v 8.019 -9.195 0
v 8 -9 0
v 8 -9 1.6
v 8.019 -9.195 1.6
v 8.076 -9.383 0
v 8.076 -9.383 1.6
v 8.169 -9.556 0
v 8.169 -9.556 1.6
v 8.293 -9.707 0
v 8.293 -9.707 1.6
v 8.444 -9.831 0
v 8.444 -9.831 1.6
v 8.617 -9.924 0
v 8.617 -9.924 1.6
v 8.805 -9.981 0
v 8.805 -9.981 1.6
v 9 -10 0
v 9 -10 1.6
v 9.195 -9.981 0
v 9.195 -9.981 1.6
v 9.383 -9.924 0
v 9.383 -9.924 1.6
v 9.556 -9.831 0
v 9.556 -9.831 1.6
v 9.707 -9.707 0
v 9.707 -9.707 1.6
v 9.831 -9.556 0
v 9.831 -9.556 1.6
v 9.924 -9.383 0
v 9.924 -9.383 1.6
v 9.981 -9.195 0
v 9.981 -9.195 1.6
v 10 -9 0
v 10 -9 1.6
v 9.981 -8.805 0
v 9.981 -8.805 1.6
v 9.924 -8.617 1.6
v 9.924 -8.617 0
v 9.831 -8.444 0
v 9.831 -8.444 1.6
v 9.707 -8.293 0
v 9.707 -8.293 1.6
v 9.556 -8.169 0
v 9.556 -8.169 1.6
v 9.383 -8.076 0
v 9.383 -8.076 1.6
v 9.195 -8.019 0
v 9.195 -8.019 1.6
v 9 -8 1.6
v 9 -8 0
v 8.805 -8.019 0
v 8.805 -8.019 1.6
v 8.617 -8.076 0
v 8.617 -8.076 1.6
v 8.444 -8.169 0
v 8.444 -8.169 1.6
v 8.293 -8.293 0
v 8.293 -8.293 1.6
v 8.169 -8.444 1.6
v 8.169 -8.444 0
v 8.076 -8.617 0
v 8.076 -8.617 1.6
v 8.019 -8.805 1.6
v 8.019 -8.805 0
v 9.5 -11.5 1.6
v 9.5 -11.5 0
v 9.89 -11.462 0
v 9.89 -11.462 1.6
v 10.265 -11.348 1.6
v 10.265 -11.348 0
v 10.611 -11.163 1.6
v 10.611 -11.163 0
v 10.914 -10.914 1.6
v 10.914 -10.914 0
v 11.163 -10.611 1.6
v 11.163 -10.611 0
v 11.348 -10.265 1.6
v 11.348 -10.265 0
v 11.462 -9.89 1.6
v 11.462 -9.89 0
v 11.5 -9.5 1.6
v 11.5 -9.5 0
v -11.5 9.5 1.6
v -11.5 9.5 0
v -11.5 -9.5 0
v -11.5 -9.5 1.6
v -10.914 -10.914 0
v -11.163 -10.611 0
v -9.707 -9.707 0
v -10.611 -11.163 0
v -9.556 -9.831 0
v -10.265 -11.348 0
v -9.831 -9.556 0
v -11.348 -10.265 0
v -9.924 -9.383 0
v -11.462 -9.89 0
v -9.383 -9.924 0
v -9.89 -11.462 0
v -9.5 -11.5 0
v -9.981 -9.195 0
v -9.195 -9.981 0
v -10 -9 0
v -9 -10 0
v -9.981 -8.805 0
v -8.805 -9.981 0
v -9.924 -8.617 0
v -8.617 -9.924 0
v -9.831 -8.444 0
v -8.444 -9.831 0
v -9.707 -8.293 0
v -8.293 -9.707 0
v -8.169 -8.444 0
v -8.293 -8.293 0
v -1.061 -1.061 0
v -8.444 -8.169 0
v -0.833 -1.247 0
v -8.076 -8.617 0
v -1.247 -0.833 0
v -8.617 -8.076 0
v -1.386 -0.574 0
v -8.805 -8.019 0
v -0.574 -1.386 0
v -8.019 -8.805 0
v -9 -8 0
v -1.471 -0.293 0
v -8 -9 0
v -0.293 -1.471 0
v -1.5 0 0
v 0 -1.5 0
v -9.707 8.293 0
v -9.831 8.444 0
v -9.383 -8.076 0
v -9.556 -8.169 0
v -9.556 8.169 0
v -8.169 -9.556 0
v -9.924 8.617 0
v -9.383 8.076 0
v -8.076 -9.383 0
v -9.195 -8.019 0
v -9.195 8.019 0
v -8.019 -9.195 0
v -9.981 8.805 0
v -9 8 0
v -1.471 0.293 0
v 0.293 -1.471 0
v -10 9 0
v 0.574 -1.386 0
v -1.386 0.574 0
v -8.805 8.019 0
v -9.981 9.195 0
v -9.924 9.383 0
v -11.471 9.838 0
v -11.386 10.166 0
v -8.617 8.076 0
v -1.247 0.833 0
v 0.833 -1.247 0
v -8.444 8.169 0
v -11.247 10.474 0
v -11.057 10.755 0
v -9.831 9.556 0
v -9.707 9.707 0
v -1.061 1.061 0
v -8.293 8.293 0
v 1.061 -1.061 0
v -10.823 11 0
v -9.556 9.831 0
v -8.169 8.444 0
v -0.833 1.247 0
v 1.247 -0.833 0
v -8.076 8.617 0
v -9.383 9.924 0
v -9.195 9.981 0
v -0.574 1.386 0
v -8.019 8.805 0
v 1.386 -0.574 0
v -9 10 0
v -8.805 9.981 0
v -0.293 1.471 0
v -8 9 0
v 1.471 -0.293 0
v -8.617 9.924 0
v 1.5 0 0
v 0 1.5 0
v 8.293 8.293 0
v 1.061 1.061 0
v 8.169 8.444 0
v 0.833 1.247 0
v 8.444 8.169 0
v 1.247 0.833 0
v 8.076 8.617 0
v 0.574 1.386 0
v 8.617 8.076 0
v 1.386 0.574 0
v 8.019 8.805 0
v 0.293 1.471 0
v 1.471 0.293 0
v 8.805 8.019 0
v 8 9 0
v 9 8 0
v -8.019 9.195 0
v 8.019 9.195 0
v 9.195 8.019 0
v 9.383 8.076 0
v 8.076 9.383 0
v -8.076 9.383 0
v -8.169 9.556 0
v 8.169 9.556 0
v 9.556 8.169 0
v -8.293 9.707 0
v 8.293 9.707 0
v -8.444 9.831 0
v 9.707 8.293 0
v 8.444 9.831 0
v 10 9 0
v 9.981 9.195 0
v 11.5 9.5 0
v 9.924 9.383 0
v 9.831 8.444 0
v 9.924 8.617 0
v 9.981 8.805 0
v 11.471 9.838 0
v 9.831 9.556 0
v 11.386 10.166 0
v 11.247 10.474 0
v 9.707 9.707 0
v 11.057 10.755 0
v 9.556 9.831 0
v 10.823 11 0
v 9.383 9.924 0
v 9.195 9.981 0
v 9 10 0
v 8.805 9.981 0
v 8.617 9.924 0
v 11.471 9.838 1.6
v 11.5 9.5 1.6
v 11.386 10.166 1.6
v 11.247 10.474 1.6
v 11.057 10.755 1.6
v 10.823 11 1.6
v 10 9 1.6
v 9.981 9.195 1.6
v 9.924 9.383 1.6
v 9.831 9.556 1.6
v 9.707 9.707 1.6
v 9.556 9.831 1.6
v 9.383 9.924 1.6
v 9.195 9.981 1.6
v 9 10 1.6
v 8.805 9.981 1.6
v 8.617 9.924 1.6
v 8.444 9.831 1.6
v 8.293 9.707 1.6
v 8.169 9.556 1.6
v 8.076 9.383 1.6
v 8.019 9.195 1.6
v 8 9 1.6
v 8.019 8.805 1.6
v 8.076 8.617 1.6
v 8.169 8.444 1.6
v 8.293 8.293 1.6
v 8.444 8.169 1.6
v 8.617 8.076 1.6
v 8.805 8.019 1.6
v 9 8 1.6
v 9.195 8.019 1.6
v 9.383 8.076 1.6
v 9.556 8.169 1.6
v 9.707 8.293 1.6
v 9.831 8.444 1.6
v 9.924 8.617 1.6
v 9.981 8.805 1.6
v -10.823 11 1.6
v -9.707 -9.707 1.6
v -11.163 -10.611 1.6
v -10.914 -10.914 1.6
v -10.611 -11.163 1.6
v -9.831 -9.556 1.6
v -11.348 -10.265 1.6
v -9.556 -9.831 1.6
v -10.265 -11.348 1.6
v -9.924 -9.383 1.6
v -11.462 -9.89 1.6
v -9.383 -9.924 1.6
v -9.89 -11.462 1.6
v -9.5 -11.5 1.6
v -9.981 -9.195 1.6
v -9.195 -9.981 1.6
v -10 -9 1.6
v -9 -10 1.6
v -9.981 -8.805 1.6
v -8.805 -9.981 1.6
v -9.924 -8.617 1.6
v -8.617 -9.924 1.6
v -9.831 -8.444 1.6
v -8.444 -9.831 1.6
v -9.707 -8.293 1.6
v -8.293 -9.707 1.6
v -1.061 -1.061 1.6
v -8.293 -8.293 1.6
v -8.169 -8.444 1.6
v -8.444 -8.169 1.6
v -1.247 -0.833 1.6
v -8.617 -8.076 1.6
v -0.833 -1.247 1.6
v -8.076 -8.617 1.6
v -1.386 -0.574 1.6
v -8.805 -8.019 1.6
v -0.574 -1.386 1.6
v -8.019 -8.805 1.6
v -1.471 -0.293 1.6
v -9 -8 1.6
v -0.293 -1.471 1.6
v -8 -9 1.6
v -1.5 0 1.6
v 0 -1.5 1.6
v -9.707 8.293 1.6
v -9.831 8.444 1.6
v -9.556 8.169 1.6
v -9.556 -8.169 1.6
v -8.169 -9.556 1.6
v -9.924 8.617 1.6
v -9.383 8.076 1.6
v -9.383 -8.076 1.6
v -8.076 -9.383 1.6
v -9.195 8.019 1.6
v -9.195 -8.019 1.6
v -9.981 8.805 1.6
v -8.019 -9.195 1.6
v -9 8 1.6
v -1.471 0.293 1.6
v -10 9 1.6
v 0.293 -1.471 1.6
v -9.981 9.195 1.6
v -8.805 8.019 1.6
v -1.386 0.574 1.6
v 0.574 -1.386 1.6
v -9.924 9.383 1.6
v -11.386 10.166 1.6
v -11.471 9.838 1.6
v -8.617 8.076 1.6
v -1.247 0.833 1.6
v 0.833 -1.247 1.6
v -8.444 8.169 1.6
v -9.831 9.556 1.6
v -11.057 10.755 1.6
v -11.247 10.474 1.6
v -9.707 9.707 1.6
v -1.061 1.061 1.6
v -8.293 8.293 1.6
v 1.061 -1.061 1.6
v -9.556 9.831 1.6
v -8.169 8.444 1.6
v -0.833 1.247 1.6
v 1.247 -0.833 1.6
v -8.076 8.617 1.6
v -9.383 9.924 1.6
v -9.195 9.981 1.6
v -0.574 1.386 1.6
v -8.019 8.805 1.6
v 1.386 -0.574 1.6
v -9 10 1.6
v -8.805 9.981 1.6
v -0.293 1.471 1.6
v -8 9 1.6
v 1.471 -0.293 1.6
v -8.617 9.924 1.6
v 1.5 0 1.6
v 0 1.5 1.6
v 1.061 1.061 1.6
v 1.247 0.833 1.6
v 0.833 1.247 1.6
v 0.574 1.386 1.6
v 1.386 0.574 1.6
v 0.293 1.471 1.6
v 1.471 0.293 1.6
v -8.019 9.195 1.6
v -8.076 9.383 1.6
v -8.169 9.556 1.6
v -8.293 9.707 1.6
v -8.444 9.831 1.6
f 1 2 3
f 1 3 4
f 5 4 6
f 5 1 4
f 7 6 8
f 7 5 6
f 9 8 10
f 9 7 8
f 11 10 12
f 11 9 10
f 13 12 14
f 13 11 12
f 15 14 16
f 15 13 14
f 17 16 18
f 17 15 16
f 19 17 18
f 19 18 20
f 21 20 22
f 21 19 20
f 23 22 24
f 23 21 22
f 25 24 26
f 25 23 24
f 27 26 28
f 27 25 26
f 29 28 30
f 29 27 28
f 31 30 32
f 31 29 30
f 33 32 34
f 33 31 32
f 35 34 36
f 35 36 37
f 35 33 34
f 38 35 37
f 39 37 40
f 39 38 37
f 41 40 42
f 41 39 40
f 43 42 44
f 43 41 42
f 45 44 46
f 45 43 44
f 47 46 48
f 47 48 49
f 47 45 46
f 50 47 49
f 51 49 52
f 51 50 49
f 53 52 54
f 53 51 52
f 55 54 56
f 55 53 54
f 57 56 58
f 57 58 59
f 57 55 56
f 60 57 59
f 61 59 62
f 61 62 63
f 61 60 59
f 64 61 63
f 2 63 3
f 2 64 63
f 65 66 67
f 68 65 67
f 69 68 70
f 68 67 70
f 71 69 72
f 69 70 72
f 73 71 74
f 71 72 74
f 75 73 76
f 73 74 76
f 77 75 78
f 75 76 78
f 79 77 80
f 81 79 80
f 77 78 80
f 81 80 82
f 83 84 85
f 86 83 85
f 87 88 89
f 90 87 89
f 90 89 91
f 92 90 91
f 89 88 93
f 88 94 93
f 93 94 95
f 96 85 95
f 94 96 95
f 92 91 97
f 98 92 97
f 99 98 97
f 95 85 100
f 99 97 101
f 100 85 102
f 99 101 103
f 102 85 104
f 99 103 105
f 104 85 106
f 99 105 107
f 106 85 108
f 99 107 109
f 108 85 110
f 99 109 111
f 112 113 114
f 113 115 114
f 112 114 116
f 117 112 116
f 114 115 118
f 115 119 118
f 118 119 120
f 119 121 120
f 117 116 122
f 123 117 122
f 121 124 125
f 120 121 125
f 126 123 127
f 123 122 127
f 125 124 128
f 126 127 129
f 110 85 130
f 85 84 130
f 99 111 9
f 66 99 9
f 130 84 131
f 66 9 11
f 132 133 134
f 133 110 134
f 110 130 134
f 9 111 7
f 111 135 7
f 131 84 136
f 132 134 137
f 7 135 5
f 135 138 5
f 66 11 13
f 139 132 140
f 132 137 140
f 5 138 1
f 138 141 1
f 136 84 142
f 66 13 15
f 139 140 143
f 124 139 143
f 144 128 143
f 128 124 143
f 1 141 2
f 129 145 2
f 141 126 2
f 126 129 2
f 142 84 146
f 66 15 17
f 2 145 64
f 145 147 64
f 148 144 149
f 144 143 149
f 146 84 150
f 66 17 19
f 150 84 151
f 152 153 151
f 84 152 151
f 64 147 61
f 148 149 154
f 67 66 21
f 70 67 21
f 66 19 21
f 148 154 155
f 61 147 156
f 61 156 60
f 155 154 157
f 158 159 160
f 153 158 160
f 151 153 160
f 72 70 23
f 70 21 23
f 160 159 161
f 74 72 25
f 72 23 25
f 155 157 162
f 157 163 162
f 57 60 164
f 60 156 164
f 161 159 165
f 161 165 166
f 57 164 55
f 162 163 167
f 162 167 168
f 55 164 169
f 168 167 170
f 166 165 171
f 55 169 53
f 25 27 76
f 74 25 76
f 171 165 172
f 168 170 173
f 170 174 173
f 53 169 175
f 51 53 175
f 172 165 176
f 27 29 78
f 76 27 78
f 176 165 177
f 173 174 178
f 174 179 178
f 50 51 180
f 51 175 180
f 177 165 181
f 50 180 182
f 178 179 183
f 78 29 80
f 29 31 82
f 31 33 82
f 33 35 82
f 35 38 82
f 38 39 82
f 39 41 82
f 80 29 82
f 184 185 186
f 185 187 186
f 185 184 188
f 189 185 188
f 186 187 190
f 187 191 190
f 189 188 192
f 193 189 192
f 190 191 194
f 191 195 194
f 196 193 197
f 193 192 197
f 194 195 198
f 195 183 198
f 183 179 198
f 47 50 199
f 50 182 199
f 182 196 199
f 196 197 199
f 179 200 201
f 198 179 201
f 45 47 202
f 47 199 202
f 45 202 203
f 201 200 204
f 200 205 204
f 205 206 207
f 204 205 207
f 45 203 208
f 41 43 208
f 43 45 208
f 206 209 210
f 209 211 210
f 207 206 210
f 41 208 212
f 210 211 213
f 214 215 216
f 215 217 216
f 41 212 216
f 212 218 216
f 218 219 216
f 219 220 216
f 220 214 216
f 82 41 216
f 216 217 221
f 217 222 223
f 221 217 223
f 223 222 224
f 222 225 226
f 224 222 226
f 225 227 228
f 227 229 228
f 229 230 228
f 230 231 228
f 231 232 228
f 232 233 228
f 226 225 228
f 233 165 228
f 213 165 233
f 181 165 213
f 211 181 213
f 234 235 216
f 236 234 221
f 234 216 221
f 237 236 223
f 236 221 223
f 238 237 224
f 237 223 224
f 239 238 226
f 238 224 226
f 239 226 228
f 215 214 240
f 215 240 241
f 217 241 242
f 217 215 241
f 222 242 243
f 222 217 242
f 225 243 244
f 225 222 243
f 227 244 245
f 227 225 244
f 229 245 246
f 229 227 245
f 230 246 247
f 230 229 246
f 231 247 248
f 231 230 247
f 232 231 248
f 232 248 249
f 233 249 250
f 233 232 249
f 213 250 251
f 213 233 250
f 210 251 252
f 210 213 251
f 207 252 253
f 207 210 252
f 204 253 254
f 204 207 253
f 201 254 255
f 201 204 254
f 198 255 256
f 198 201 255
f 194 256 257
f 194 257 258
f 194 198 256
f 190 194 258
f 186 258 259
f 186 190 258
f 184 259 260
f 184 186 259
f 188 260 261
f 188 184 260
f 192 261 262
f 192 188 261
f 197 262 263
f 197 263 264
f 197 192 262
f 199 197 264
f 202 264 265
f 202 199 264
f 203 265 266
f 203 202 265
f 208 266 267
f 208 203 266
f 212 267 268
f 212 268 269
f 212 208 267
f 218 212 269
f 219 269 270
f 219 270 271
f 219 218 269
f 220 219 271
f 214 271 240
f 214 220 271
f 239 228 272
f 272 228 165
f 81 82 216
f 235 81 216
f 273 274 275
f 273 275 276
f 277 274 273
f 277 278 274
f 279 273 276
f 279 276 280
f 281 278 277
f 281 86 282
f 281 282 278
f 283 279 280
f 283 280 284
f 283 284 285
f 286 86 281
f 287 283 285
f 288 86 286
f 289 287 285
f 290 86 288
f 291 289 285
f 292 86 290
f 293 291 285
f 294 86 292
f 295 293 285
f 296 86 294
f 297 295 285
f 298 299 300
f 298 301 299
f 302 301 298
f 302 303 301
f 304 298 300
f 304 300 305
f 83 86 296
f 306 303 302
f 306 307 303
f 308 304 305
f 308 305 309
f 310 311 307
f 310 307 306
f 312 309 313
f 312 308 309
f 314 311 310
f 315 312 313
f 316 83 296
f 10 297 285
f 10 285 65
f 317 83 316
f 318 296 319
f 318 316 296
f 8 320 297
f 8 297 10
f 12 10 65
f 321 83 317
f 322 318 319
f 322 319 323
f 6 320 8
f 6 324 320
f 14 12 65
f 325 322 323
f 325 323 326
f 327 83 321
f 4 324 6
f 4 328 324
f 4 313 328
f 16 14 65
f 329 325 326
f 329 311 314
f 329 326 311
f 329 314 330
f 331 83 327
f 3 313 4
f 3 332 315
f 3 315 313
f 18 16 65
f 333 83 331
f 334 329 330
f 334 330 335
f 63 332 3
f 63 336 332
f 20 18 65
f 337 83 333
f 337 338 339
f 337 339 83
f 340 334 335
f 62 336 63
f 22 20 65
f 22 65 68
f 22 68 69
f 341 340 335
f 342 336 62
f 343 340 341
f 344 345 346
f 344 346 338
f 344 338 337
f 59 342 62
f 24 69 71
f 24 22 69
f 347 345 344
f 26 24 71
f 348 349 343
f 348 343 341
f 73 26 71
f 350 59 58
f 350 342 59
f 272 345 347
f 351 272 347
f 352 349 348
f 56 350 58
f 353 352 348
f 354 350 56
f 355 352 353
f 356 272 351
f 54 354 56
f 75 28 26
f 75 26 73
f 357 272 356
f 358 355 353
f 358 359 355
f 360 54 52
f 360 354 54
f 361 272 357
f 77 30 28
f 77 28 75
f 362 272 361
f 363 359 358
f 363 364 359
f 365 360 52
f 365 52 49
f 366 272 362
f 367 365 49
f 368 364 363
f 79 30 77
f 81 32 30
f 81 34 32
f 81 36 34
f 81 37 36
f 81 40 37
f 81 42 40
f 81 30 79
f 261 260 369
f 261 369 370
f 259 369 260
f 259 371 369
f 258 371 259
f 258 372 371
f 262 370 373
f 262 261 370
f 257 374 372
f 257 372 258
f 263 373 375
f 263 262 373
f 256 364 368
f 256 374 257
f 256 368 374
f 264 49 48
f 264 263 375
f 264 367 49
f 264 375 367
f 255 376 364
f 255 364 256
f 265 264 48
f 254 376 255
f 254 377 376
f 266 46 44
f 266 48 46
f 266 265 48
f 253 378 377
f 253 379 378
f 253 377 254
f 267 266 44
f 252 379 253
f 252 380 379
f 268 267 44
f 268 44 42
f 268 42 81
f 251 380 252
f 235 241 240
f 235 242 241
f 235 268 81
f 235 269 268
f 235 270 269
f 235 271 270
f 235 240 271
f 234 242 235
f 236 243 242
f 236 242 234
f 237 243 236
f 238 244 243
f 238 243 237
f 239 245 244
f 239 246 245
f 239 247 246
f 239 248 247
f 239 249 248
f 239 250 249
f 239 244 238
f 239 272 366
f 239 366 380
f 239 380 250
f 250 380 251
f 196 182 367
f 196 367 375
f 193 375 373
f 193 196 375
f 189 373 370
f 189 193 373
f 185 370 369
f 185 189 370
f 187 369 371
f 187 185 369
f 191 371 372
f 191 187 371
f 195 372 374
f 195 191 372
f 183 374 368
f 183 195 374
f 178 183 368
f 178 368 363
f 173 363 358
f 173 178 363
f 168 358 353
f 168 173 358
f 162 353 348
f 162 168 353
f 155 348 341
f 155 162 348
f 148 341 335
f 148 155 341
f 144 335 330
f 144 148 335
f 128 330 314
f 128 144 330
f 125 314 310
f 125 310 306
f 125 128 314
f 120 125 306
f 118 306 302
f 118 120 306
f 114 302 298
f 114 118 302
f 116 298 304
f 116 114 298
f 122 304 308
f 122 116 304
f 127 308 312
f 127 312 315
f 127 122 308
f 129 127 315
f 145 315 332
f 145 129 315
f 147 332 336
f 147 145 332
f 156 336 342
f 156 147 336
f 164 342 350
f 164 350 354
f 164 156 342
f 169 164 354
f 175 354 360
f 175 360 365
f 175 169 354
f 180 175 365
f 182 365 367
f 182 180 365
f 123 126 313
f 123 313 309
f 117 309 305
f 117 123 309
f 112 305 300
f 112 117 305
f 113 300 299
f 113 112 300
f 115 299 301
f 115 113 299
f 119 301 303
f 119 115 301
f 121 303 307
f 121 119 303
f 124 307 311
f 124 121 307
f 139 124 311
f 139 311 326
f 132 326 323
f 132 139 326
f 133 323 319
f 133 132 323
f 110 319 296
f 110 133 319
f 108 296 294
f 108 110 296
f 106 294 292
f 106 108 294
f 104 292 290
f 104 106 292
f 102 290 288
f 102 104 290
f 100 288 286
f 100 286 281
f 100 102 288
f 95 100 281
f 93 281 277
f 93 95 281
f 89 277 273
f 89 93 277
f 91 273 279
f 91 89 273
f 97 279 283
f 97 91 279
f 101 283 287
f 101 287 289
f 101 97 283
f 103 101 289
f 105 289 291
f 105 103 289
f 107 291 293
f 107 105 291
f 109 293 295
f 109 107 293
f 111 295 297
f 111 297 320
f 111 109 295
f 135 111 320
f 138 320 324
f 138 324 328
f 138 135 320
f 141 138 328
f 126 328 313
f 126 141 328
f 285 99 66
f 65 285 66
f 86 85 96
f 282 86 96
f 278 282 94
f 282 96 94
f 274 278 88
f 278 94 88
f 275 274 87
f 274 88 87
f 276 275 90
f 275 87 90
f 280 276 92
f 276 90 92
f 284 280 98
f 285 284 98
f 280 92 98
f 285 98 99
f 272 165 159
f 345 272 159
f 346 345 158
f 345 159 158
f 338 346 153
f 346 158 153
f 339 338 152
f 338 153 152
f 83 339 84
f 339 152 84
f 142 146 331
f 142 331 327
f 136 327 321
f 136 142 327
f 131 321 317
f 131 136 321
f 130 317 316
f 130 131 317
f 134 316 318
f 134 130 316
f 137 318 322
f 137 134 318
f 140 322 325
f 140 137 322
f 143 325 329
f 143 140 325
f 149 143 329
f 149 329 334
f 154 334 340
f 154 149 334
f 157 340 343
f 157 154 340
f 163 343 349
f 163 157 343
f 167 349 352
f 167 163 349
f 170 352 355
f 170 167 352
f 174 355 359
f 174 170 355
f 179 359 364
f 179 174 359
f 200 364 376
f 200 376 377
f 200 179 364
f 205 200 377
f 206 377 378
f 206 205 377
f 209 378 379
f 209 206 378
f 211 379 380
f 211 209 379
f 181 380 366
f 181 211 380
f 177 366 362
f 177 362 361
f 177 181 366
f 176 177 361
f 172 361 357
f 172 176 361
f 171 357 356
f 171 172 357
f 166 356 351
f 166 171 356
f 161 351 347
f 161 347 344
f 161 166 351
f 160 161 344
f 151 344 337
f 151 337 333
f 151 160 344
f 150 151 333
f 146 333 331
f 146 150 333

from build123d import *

# Parameters (mm, degrees)
SKETCH1_R           = 1.5
SKETCH1_R_2         = 1
BOSS_EXTRUDE1_DEPTH = 1.6
SKETCH3_W           = 30.784918317
SKETCH3_H           = 1.24969352
CUT_EXTRUDE2_DEPTH  = 10


with BuildPart() as part:
    # Sketch1 → Boss-Extrude1 (new body)
    with BuildSketch(Plane.XY):
        with BuildLine():
            Line((-9.5, -11.5), (9.5, -11.5))
            ThreePointArc((9.5, -11.5), (10.914213562, -10.914213562), (11.5, -9.5))
            Line((11.5, -9.5), (11.5, 9.5))
            ThreePointArc((11.5, 9.5), (10.914213562, 10.914213562), (9.5, 11.5))
            Line((9.5, 11.5), (-9.5, 11.5))
            ThreePointArc((-9.5, 11.5), (-10.914213562, 10.914213562), (-11.5, 9.5))
            Line((-11.5, 9.5), (-11.5, -9.5))
            ThreePointArc((-11.5, -9.5), (-10.914213562, -10.914213562), (-9.5, -11.5))
        make_face()
        Circle(SKETCH1_R, mode=Mode.SUBTRACT)
        with Locations((9, 9)):
            Circle(SKETCH1_R_2, mode=Mode.SUBTRACT)
        with Locations(Location((-9, 9, 0), (0, 0, 180))):
            Circle(SKETCH1_R_2, mode=Mode.SUBTRACT)
        with Locations((-9, -9)):
            Circle(SKETCH1_R_2, mode=Mode.SUBTRACT)
        with Locations(Location((9, -9, 0), (0, 0, 180))):
            Circle(SKETCH1_R_2, mode=Mode.SUBTRACT)
    extrude(amount=BOSS_EXTRUDE1_DEPTH)

    # Sketch3 → Cut-Extrude2 (cut)
    with BuildSketch(Plane(origin=(0, 0, 0), x_dir=(-1, 0, 0), z_dir=(0, 0, -1))):
        with Locations((-2.857529043, 11.62484676)):
            Rectangle(SKETCH3_W, SKETCH3_H)
    extrude(amount=-CUT_EXTRUDE2_DEPTH, mode=Mode.SUBTRACT)


solid = part.part
